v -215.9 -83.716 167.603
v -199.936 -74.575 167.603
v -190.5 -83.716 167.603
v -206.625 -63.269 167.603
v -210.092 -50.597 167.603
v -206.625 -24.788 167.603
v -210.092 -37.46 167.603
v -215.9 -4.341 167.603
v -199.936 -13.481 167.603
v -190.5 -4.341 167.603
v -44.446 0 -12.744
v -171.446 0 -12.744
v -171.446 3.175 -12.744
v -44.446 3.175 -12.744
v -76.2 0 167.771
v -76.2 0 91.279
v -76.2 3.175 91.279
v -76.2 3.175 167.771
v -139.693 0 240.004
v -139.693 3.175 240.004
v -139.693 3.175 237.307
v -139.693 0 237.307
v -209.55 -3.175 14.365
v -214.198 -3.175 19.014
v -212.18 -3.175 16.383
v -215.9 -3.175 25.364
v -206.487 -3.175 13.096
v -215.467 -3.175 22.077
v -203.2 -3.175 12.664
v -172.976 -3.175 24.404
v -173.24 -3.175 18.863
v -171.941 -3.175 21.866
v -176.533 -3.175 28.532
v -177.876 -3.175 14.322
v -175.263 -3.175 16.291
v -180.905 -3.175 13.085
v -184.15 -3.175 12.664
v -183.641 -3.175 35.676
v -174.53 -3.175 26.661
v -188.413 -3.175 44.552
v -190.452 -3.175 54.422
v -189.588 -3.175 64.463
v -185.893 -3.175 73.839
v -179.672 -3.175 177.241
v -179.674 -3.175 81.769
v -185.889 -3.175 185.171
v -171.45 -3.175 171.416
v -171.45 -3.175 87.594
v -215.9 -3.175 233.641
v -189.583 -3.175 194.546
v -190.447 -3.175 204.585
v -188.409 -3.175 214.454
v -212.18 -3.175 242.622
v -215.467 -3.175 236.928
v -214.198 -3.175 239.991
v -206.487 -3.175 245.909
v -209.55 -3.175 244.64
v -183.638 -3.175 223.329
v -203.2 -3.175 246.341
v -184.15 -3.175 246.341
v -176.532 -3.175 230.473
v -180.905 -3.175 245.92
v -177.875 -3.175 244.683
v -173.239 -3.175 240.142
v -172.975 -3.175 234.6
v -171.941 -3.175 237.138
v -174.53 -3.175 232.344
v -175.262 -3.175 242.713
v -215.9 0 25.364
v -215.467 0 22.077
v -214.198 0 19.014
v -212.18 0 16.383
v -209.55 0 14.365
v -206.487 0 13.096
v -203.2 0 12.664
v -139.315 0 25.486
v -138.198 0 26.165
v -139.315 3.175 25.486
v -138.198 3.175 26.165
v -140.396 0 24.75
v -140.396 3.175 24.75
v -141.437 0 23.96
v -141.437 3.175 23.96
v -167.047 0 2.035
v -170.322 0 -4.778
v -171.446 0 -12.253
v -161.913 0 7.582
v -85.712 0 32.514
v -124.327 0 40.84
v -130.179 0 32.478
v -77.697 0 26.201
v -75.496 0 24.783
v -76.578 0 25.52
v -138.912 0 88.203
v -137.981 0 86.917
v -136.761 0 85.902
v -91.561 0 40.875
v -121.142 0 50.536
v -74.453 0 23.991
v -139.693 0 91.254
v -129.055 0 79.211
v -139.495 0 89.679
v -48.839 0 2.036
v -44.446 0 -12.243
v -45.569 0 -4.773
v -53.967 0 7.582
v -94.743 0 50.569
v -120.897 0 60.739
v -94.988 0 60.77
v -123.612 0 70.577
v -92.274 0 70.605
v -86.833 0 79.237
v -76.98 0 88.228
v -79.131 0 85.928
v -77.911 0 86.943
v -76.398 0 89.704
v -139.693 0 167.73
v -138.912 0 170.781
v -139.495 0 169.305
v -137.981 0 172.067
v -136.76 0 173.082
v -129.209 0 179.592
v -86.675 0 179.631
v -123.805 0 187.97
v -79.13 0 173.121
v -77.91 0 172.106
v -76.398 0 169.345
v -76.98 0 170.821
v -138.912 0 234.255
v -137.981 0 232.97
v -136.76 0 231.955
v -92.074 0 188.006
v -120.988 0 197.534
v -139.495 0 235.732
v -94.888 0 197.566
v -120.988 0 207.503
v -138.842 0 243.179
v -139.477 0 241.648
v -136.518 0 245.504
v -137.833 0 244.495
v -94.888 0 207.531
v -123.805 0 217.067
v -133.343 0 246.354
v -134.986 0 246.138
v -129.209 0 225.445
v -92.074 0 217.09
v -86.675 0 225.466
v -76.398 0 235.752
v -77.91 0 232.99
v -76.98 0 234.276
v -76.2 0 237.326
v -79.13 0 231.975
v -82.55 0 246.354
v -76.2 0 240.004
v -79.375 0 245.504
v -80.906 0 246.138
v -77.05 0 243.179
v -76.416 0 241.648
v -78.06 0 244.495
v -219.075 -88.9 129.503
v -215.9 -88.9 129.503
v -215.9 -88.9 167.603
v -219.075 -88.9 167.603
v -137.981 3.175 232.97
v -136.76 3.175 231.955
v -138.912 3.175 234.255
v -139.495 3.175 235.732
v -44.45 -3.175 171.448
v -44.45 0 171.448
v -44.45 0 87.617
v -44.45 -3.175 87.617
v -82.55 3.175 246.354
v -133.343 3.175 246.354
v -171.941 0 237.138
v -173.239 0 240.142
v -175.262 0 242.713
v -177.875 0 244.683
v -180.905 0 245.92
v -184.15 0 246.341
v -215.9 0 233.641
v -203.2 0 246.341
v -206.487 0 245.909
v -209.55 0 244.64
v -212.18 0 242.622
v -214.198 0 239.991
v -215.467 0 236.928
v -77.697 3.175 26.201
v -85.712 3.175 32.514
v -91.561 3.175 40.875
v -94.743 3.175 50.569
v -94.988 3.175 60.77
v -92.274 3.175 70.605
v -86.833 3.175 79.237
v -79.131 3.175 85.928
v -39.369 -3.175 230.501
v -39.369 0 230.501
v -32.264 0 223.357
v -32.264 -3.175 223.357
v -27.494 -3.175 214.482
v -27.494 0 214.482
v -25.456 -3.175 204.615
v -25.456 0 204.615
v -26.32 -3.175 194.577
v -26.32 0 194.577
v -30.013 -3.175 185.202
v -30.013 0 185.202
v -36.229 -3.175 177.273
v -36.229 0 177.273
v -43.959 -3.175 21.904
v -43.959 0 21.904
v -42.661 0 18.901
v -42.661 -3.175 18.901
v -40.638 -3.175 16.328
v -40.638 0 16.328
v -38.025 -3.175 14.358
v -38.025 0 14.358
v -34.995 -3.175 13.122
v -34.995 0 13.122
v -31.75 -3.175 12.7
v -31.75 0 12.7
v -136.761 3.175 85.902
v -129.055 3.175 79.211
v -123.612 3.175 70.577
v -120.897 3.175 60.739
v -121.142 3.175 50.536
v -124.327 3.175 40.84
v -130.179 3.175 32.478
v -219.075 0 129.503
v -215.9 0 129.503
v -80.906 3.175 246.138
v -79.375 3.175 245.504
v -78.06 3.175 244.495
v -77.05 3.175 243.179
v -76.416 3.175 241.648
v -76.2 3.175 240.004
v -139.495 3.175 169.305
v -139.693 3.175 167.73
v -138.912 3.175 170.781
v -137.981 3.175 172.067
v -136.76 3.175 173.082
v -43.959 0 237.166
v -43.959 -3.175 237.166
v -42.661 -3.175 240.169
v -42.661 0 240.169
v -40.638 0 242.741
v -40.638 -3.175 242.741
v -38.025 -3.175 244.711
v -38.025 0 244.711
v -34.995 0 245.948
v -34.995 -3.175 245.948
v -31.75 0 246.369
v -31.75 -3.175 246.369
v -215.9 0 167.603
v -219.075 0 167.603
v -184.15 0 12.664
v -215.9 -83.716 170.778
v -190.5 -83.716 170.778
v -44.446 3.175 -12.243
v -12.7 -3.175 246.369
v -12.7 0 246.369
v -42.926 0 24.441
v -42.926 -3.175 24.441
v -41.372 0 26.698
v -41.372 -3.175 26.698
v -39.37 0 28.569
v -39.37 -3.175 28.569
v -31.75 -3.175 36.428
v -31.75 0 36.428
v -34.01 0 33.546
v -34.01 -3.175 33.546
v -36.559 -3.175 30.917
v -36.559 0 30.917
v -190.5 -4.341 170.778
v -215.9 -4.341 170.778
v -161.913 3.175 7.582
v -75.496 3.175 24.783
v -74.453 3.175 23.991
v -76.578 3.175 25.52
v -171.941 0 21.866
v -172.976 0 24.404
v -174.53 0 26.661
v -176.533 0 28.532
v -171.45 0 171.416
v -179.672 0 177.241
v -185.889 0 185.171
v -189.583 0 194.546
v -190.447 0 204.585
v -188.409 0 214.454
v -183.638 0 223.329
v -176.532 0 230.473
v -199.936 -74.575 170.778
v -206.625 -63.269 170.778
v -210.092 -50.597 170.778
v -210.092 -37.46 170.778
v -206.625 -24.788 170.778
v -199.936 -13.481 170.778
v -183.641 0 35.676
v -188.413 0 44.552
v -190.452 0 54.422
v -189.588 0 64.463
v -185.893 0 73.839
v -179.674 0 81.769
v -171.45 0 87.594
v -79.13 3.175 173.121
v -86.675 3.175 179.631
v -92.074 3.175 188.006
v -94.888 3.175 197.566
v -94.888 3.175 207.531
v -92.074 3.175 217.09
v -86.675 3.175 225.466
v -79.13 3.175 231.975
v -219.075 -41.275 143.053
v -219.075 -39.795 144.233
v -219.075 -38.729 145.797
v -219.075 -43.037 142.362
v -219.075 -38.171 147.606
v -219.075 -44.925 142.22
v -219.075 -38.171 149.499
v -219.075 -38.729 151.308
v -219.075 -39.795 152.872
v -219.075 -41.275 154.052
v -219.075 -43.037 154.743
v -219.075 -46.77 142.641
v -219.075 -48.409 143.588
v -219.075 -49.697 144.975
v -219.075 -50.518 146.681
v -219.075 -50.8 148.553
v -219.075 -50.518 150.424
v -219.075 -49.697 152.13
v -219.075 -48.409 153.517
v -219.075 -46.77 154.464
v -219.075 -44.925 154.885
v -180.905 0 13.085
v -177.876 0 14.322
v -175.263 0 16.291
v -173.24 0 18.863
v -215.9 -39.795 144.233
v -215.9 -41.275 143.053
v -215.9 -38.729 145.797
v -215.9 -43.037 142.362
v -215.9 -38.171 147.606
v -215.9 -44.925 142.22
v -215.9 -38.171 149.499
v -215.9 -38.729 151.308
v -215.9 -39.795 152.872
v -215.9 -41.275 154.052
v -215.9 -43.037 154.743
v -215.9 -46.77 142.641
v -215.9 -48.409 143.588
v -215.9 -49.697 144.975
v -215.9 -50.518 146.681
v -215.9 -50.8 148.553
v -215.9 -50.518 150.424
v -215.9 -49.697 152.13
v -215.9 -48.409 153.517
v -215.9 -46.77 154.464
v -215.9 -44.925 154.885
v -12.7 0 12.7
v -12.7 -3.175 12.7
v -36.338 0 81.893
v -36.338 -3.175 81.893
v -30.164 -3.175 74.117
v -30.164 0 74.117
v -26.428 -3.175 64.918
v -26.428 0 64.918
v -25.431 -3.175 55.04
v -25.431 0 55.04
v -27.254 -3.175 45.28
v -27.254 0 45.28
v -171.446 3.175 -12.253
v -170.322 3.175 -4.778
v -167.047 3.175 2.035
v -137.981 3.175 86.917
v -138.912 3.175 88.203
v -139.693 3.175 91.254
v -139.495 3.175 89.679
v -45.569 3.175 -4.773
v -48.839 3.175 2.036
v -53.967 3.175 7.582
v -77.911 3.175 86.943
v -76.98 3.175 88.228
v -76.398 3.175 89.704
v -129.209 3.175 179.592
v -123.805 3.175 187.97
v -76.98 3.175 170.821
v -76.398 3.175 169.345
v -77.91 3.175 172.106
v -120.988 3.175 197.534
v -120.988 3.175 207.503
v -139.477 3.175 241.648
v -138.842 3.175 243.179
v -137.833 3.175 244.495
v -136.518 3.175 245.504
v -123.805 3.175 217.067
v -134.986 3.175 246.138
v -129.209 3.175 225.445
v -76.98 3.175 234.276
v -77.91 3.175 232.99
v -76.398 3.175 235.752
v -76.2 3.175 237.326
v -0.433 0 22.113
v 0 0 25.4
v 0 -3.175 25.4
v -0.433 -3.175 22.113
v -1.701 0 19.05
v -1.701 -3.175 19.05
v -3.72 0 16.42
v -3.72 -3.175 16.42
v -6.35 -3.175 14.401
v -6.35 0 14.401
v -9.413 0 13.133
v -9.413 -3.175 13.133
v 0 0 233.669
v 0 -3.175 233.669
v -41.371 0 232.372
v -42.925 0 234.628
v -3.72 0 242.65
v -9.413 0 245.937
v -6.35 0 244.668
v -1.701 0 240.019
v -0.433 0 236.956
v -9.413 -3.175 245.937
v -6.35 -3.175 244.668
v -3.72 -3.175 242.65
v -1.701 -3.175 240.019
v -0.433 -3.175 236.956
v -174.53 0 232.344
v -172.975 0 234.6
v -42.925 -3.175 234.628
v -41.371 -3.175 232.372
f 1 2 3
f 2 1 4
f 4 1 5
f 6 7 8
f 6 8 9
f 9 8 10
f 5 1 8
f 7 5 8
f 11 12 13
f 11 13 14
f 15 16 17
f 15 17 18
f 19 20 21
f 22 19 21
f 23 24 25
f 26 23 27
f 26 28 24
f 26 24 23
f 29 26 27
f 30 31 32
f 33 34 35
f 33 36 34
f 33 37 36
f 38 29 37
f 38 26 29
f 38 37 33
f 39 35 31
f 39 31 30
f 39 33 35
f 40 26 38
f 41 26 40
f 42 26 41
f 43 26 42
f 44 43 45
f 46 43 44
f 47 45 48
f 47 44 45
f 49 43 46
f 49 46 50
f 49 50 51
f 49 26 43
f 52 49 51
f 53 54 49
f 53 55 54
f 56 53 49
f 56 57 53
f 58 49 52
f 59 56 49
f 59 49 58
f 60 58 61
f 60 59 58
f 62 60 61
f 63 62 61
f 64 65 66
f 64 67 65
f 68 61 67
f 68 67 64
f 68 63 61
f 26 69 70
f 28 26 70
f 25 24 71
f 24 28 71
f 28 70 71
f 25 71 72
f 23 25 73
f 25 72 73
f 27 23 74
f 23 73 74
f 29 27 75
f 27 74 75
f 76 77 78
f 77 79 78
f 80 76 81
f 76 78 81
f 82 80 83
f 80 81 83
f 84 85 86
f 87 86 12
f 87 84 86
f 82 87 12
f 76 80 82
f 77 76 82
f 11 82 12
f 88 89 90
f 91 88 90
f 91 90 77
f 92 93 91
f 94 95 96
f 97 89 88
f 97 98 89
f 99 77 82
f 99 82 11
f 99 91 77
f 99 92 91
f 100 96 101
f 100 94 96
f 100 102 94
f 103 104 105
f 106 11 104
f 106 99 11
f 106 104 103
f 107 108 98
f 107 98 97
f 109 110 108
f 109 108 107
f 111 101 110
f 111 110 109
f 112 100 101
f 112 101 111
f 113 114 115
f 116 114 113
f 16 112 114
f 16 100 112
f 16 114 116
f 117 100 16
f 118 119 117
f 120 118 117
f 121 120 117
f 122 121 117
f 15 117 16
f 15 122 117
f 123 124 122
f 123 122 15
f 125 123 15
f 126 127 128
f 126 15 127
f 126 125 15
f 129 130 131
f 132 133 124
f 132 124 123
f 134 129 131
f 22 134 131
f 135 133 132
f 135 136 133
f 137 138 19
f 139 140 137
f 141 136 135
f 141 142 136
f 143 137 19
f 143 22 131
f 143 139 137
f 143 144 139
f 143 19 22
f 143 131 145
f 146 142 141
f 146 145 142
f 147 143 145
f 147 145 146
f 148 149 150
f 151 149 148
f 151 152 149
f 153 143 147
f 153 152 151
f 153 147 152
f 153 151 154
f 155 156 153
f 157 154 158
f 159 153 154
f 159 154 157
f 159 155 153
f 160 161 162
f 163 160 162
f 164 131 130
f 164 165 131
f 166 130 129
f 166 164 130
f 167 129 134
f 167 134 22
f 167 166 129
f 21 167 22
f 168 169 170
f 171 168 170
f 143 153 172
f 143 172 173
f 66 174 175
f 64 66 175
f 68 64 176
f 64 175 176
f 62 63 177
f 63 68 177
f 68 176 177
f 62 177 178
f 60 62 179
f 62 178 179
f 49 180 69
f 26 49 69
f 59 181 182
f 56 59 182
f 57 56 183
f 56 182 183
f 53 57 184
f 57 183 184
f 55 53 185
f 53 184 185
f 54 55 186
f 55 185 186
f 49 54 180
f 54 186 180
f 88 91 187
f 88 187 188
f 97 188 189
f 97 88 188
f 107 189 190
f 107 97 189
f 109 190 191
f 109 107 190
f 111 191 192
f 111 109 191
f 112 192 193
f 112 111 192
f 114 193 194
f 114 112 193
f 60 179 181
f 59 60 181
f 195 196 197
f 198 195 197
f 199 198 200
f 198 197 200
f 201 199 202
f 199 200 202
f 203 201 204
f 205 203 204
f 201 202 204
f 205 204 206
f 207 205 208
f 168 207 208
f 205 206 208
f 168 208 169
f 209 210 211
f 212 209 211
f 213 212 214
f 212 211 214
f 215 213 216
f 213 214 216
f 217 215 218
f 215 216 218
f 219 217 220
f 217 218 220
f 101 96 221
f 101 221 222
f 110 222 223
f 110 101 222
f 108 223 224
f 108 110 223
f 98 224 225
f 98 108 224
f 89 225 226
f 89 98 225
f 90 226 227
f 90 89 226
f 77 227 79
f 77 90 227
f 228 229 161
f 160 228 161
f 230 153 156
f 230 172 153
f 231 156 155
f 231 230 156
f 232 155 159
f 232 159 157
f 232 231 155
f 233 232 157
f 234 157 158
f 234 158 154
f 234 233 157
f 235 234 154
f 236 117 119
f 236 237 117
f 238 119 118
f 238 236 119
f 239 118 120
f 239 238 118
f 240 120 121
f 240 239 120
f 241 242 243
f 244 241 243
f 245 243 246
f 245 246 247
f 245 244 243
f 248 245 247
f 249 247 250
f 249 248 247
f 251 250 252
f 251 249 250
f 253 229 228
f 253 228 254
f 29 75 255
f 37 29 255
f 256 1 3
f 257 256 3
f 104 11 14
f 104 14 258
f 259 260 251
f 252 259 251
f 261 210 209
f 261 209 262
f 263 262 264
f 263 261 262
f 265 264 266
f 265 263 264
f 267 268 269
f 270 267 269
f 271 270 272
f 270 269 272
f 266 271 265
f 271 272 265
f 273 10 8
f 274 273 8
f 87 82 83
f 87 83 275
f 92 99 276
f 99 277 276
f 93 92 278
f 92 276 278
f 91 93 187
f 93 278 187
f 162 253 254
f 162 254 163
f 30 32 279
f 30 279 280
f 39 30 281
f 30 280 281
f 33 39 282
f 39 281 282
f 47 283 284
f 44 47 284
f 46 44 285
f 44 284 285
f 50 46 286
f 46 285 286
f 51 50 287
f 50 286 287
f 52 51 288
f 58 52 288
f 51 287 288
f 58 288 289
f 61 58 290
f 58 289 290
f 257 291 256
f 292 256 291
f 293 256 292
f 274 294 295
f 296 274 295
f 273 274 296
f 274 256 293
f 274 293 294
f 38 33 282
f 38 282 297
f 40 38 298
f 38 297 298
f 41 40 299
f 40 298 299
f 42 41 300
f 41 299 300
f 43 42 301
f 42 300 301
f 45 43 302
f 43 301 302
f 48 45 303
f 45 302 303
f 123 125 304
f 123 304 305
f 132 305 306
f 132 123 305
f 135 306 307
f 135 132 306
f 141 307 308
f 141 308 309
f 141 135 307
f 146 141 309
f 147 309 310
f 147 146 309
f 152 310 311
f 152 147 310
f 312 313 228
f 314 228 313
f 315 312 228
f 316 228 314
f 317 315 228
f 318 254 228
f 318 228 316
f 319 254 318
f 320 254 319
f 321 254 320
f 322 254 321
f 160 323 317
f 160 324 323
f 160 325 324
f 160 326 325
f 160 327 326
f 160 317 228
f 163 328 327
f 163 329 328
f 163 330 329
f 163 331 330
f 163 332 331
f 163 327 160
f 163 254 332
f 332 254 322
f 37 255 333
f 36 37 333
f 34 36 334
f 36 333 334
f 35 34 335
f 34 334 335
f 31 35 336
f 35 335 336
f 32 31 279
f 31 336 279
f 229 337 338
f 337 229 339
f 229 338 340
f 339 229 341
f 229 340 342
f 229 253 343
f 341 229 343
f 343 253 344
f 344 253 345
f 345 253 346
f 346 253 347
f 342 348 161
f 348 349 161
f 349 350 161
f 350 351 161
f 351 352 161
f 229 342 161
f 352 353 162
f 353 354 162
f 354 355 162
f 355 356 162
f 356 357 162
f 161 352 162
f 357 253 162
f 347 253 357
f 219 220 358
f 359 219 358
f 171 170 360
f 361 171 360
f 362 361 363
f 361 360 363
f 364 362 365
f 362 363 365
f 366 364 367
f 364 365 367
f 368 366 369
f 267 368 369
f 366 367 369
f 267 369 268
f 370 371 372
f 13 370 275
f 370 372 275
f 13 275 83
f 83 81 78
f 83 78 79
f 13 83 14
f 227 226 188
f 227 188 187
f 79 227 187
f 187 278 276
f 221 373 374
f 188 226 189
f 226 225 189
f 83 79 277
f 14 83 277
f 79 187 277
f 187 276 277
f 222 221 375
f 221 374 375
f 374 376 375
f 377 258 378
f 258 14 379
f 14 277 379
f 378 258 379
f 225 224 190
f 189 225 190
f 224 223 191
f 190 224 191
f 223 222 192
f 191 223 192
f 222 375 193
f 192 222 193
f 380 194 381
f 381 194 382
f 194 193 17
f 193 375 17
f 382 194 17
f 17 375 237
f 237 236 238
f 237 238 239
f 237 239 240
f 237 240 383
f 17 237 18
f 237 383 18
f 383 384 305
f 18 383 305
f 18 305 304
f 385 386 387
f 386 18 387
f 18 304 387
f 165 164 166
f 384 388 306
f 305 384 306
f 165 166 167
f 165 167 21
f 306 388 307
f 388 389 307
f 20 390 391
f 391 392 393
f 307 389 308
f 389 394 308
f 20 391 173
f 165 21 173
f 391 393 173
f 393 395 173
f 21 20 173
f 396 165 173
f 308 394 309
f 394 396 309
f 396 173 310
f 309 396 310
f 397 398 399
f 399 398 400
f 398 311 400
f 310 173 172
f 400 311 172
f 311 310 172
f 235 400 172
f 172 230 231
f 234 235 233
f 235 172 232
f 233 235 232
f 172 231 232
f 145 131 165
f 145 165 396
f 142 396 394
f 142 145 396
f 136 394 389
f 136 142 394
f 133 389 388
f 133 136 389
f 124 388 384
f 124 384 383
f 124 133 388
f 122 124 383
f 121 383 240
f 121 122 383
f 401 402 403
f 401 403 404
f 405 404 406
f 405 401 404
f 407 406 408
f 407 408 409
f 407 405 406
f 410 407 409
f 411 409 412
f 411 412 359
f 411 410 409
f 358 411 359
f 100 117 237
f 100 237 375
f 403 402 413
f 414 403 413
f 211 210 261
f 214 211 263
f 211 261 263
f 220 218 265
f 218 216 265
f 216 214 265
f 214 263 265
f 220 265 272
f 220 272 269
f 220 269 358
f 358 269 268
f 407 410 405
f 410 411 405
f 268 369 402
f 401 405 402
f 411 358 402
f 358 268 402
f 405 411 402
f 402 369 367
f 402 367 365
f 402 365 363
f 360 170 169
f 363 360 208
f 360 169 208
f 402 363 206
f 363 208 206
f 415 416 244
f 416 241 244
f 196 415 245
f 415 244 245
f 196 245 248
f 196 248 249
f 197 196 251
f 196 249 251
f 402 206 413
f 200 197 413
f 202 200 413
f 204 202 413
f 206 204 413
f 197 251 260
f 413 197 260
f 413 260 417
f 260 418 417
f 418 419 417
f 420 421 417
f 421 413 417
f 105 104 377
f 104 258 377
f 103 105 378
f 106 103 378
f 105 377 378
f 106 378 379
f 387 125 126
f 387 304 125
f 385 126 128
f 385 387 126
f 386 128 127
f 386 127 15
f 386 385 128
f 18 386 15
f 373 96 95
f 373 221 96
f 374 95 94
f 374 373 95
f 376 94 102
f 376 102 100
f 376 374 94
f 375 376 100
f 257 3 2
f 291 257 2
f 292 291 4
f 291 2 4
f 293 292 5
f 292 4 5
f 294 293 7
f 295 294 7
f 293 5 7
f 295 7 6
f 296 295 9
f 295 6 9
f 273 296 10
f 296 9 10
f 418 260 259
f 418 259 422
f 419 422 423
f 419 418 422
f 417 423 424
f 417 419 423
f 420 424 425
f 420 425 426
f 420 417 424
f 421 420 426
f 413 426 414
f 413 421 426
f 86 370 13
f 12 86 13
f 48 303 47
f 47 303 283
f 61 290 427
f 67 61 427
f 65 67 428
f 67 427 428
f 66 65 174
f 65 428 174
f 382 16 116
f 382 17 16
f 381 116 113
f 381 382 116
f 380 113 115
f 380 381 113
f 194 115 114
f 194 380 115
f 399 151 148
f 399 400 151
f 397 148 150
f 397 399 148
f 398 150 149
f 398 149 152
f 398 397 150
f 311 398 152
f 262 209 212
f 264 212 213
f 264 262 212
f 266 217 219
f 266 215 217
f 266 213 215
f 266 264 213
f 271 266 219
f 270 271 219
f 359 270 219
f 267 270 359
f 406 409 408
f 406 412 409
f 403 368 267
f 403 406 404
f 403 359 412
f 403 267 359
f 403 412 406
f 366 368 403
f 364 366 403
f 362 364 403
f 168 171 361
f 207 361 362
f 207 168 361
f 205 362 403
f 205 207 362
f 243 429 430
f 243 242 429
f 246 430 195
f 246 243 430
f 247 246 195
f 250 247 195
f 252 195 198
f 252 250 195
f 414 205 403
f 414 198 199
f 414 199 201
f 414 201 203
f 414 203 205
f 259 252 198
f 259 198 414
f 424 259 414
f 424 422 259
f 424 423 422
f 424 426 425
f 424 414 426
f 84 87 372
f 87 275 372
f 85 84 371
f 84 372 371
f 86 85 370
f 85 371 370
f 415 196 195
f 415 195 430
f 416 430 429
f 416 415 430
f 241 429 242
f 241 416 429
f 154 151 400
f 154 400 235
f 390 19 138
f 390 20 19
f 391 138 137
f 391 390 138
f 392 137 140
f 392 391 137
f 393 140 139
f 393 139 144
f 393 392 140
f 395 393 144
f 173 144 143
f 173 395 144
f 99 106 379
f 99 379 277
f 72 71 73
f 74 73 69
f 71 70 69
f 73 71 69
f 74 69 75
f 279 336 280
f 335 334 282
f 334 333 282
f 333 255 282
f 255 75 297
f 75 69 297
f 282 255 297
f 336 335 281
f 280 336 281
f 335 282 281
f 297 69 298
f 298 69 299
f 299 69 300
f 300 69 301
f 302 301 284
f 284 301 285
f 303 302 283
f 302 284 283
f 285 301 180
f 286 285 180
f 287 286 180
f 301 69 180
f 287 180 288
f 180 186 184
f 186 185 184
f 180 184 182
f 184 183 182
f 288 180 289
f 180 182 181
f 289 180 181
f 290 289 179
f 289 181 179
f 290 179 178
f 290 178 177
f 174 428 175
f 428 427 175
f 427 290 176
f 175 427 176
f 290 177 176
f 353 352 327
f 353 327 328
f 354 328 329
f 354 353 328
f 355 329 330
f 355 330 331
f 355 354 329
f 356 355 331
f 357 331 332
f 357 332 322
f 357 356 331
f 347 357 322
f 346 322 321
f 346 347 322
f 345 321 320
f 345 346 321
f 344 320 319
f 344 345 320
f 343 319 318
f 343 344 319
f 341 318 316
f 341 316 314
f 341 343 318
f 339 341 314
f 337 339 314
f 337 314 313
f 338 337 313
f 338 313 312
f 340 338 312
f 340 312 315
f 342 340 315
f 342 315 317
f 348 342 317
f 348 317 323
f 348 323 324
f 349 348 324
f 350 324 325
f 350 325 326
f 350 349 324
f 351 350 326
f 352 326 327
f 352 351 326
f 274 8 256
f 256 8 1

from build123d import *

# Parameters (mm, degrees)
F1_DEPTH      = 3.175
F2_T1_DEPTH   = 66.674967319
F2_T3_DEPTH   = 66.6750326811
F2_T5_DEPTH   = 38.1323821457
F2_T7_DEPTH   = 38.1378851793
F2_T9_DEPTH   = 66.675
F2_2_T1_DEPTH = 66.6749346379
F2_2_T3_DEPTH = 38.1476659019
F2_2_T5_DEPTH = 38.1421437691
F2_2_T7_DEPTH = 66.675
F2_2_T9_DEPTH = 66.6750326811
F4_DEPTH      = 3.175
F5_R          = 25.4
F6_R          = 6.35
F7_W          = 88.9
F7_H          = 38.1
F7_R          = 6.35
F8_DEPTH      = 3.175
F10_DEPTH     = 3.175


# Not quite as in the source:
# - a fillet or chamfer that OpenCascade refuses, or shapes differently, is made with other operations: its cross-section is extruded or revolved along the edge and cut away or added
# - ends of sketch curves that miss each other by under 0.0002 mm in the source are joined


with BuildPart() as f1:
    # F0 (on Front) → F1 (new body)
    with BuildSketch(Plane.XZ):
        with BuildLine():
            Line((-44.45, 25.4), (-44.4500065362, 12.7))
            Line((-44.4500065362, 12.7), (0, 12.7))
            Line((0, 12.7), (0, 246.3693658836))
            Line((0, 246.3693658836), (-44.4498862754, 246.3693658836))
            Line((-44.4498862754, 246.3693658836), (-44.4498928116, 233.6693658836))
            ThreePointArc((-44.4498928116, 233.6693658836), (-25.3953330127, 202.5585016842), (-44.4499248348, 171.4476570981))
            Line((-44.4499248348, 171.4476570981), (-44.4499679793, 87.6170231262))
            ThreePointArc((-44.4499679793, 87.6170231262), (-26.4276710435, 64.9184373675), (-31.7499999998, 36.4280565915))
            ThreePointArc((-31.7499999998, 36.4280565915), (-37.4261979997, 30.1380724116), (-44.45, 25.4))
        make_face()
    extrude(amount=F1_DEPTH)

    # F2: fillet of radius 12.7 on 6 edges, made by hand

    # F2_s2 → F2_t1 (cut)
    with BuildSketch(Plane.XZ.offset(-31.7499836595)):
        with BuildLine():
            ThreePointArc((-44.4498928116, 233.6693724198), (-40.7301466218, 242.6496243156), (-31.7498928116, 246.3693658836))
            Line((-31.7498928116, 246.3693658836), (-44.4498862754, 246.3693658836))
            Line((-44.4498862754, 246.3693658836), (-44.4498928116, 233.6693724198))
        make_face()
    extrude(amount=F2_T1_DEPTH, mode=Mode.SUBTRACT)

    # F2_s4 → F2_t3 (cut)
    with BuildSketch(Plane.XZ.offset(-31.7500163405)):
        with BuildLine():
            ThreePointArc((-44.45, 25.4000065362), (-40.730258432, 16.4197461898), (-31.75, 12.7))
            Line((-31.75, 12.7), (-44.4500065362, 12.7))
            Line((-44.4500065362, 12.7), (-44.45, 25.4000065362))
        make_face()
    extrude(amount=F2_T3_DEPTH, mode=Mode.SUBTRACT)

    # F2_s6 → F2_t5 (cut)
    with BuildSketch(Plane.XZ.offset(-17.4786910728)):
        with BuildLine():
            ThreePointArc((-44.4500035982, 18.4085235709), (-43.1092271942, 24.088133157), (-39.3700026387, 28.5685177543))
            ThreePointArc((-39.3700026387, 28.5685177543), (-41.8419793432, 26.8752011139), (-44.45, 25.4))
            Line((-44.45, 25.4), (-44.4500035982, 18.4085235709))
        make_face()
    extrude(amount=F2_T5_DEPTH, mode=Mode.SUBTRACT)

    # F2_s8 → F2_t7 (cut)
    with BuildSketch(Plane.XZ.offset(-17.4814425896)):
        with BuildLine():
            ThreePointArc((-39.3686742261, 230.5010252567), (-43.1087763961, 234.9816474858), (-44.4498892128, 240.6619429195))
            Line((-44.4498892128, 240.6619429195), (-44.4498928116, 233.6693658836))
            ThreePointArc((-44.4498928116, 233.6693658836), (-41.8412545983, 232.1942967863), (-39.3686742261, 230.5010252567))
        make_face()
    extrude(amount=F2_T7_DEPTH, mode=Mode.SUBTRACT)

    # F2_s10 → F2_t9 (cut)
    with BuildSketch(Plane.XZ.offset(-31.75)):
        with BuildLine():
            ThreePointArc((-12.7, 246.3693658836), (-3.7197438789, 242.6496220047), (0, 233.6693658836))
            Line((0, 233.6693658836), (0, 246.3693658836))
            Line((0, 246.3693658836), (-12.7, 246.3693658836))
        make_face()
        with BuildLine():
            ThreePointArc((0, 25.4), (-3.7197438789, 16.4197438789), (-12.7, 12.7))
            Line((-12.7, 12.7), (0, 12.7))
            Line((0, 12.7), (0, 25.4))
        make_face()
    extrude(amount=F2_T9_DEPTH, mode=Mode.SUBTRACT)


with BuildPart() as f1b:
    # F0 (on Front) → F1, piece 2 (new body)
    with BuildSketch(Plane.XZ):
        with BuildLine():
            Line((-171.4499549, 87.5937033957), (-171.4499117598, 171.4160283107))
            ThreePointArc((-171.4499117598, 171.4160283107), (-190.5080250242, 202.5287049682), (-171.4498797348, 233.6413620087))
            Line((-171.4498797348, 233.6413620087), (-171.4498731986, 246.3413620087))
            Line((-171.4498731986, 246.3413620087), (-215.8997464016, 246.3413848854))
            Line((-215.8997464016, 246.3413848854), (-215.8997464016, 12.6636870682))
            Line((-215.8997464016, 12.6636870682), (-171.4499999998, 12.6636870682))
            Line((-171.4499999998, 12.6636870682), (-171.4499869274, 25.3636870682))
            ThreePointArc((-171.4499869274, 25.3636870682), (-190.5126920115, 56.4787050428), (-171.4499549, 87.5937033957))
        make_face()
    extrude(amount=F1_DEPTH)

    # F2#2: fillet of radius 12.7 on 6 edges, made by hand

    # F2_2_s2 → F2_2_t1 (cut)
    with BuildSketch(Plane.XZ.offset(-31.749967319)):
        with BuildLine():
            ThreePointArc((-184.1499869274, 12.6636870682), (-175.1697354281, 16.3834263254), (-171.4499869274, 25.3636739958))
            Line((-171.4499869274, 25.3636739958), (-171.4499999998, 12.6636870682))
            Line((-171.4499999998, 12.6636870682), (-184.1499869274, 12.6636870682))
        make_face()
    extrude(amount=F2_2_T1_DEPTH, mode=Mode.SUBTRACT)

    # F2_2_s4 → F2_2_t3 (cut)
    with BuildSketch(Plane.XZ.offset(-17.486332951)):
        with BuildLine():
            ThreePointArc((-171.4499941271, 18.3691538878), (-172.7917123612, 24.050666351), (-176.5333802296, 28.5317056557))
            ThreePointArc((-176.5333802296, 28.5317056557), (-174.0597246836, 26.8385178049), (-171.4499869274, 25.3636870682))
            Line((-171.4499869274, 25.3636870682), (-171.4499941271, 18.3691538878))
        make_face()
    extrude(amount=F2_2_T3_DEPTH, mode=Mode.SUBTRACT)

    # F2_2_s6 → F2_2_t5 (cut)
    with BuildSketch(Plane.XZ.offset(-17.4835718845)):
        with BuildLine():
            ThreePointArc((-176.5320491725, 230.4731678841), (-172.7912596702, 234.9539670783), (-171.4498761355, 240.6347907625))
            Line((-171.4498761355, 240.6347907625), (-171.4498797348, 233.6413620087))
            ThreePointArc((-171.4498797348, 233.6413620087), (-174.058998545, 232.1663999192), (-176.5320491725, 230.4731678841))
        make_face()
    extrude(amount=F2_2_T5_DEPTH, mode=Mode.SUBTRACT)

    # F2_2_s8 → F2_2_t7 (cut)
    with BuildSketch(Plane.XZ.offset(-31.75)):
        with BuildLine():
            ThreePointArc((-171.4498797348, 233.6413620087), (-175.1696189919, 242.6216200442), (-184.1498731986, 246.3413685449))
            Line((-184.1498731986, 246.3413685449), (-171.4498731986, 246.3413620087))
            Line((-171.4498731986, 246.3413620087), (-171.4498797348, 233.6413620087))
        make_face()
        with BuildLine():
            ThreePointArc((-215.8997464016, 25.3636870682), (-212.1800025226, 16.3834309472), (-203.1997464016, 12.6636870682))
            Line((-203.1997464016, 12.6636870682), (-215.8997464016, 12.6636870682))
            Line((-215.8997464016, 12.6636870682), (-215.8997464016, 25.3636870682))
        make_face()
    extrude(amount=F2_2_T7_DEPTH, mode=Mode.SUBTRACT)

    # F2_2_s10 → F2_2_t9 (cut)
    with BuildSketch(Plane.XZ.offset(-31.7500163405)):
        with BuildLine():
            ThreePointArc((-203.1997398653, 246.3413783492), (-212.1800002117, 242.6216367812), (-215.8997464016, 233.6413783492))
            Line((-215.8997464016, 233.6413783492), (-215.8997464016, 246.3413848854))
            Line((-215.8997464016, 246.3413848854), (-203.1997398653, 246.3413783492))
        make_face()
    extrude(amount=F2_2_T9_DEPTH, mode=Mode.SUBTRACT)


with BuildPart() as f4:
    # F3 (on Front) → F4 (new body)
    with BuildSketch(Plane.XZ):
        with BuildLine():
            Line((-139.692944115, 171.4034480763), (-139.6929441151, 87.5811234915))
            ThreePointArc((-139.6929441151, 87.5811234915), (-120.6347981808, 56.4684481475), (-139.6929441152, 25.3557728035))
            Line((-139.6929441152, 25.3557728035), (-171.4463452584, -0.0442271965))
            Line((-171.4463452584, -0.0442271965), (-171.4463452584, -12.7442271965))
            Line((-171.4463452584, -12.7442271965), (-107.9463452584, -12.7442271965))
            Line((-107.9463452584, -12.7442271965), (-44.4463452584, -12.7442271965))
            Line((-44.4463452584, -12.7442271965), (-44.4463452584, -0.0442271965))
            Line((-44.4463452584, -0.0442271965), (-76.1997464016, 25.3897610103))
            ThreePointArc((-76.1997464016, 25.3897610103), (-95.2497464016, 56.4982807437), (-76.1997464016, 87.606800477))
            Line((-76.1997464016, 87.606800477), (-76.1997464016, 171.442142989))
            ThreePointArc((-76.1997464016, 171.442142989), (-95.2452147999, 202.548280738), (-76.1997464016, 233.6544184871))
            Line((-76.1997464016, 233.6544184871), (-76.1997464016, 246.3544184871))
            Line((-76.1997464016, 246.3544184871), (-139.692944115, 246.3544184871))
            Line((-139.692944115, 246.3544184871), (-139.692944115, 233.6334480764))
            ThreePointArc((-139.692944115, 233.6334480764), (-120.6302390309, 202.5184480763), (-139.692944115, 171.4034480763))
        make_face()
    extrude(amount=-F4_DEPTH)

    # F5
    f5_edges = [f4.edges().sort_by_distance(p)[0] for p in [
        (-171.446345, 1.5875, -0.044227),
        (-139.692944, 1.5875, 25.355773),
        (-76.199746, 1.5875, 25.389761),
        (-44.446345, 1.5875, -0.044227),
    ]]
    fillet(f5_edges, radius=F5_R)

    # F6
    f6_edges = [f4.edges().sort_by_distance(p)[0] for p in [
        (-139.692944, 1.5875, 246.354418),
        (-76.199746, 1.5875, 246.354418),
        (-76.199746, 1.5875, 233.654418),
        (-139.692944, 1.5875, 233.633448),
        (-139.692944, 1.5875, 171.403448),
        (-76.199746, 1.5875, 171.442143),
        (-76.199746, 1.5875, 87.6068),
        (-139.692944, 1.5875, 87.581123),
    ]]
    fillet(f6_edges, radius=F6_R)


with BuildPart() as f8:
    # F7 (on face) → F8 (new body)
    with BuildSketch(Plane(origin=(-215.8997464016, 0, 0), x_dir=(0, -1, 0), z_dir=(-1, 0, 0))):
        with Locations((44.45, 148.5525327087)):
            Rectangle(F7_W, F7_H)
        with Locations((44.45, 148.5525327087)):
            Circle(F7_R, mode=Mode.SUBTRACT)
    extrude(amount=F8_DEPTH)


with BuildPart() as f10:
    # F9 (on face) → F10 (new body)
    with BuildSketch(Plane.XY.offset(167.6025327087)):
        with BuildLine():
            Line((-190.4997464016, -4.3409317732), (-215.8997464016, -4.3409317732))
            Line((-215.8997464016, -4.3409317732), (-215.8997464016, -83.7159317732))
            Line((-215.8997464016, -83.7159317732), (-190.4997464016, -83.7159317732))
            ThreePointArc((-190.4997464016, -83.7159317732), (-210.5315857086, -44.0284317732), (-190.4997464016, -4.3409317732))
        make_face()
    extrude(amount=F10_DEPTH)


solid = Compound([f1.part, f1b.part, f4.part, f8.part, f10.part])
